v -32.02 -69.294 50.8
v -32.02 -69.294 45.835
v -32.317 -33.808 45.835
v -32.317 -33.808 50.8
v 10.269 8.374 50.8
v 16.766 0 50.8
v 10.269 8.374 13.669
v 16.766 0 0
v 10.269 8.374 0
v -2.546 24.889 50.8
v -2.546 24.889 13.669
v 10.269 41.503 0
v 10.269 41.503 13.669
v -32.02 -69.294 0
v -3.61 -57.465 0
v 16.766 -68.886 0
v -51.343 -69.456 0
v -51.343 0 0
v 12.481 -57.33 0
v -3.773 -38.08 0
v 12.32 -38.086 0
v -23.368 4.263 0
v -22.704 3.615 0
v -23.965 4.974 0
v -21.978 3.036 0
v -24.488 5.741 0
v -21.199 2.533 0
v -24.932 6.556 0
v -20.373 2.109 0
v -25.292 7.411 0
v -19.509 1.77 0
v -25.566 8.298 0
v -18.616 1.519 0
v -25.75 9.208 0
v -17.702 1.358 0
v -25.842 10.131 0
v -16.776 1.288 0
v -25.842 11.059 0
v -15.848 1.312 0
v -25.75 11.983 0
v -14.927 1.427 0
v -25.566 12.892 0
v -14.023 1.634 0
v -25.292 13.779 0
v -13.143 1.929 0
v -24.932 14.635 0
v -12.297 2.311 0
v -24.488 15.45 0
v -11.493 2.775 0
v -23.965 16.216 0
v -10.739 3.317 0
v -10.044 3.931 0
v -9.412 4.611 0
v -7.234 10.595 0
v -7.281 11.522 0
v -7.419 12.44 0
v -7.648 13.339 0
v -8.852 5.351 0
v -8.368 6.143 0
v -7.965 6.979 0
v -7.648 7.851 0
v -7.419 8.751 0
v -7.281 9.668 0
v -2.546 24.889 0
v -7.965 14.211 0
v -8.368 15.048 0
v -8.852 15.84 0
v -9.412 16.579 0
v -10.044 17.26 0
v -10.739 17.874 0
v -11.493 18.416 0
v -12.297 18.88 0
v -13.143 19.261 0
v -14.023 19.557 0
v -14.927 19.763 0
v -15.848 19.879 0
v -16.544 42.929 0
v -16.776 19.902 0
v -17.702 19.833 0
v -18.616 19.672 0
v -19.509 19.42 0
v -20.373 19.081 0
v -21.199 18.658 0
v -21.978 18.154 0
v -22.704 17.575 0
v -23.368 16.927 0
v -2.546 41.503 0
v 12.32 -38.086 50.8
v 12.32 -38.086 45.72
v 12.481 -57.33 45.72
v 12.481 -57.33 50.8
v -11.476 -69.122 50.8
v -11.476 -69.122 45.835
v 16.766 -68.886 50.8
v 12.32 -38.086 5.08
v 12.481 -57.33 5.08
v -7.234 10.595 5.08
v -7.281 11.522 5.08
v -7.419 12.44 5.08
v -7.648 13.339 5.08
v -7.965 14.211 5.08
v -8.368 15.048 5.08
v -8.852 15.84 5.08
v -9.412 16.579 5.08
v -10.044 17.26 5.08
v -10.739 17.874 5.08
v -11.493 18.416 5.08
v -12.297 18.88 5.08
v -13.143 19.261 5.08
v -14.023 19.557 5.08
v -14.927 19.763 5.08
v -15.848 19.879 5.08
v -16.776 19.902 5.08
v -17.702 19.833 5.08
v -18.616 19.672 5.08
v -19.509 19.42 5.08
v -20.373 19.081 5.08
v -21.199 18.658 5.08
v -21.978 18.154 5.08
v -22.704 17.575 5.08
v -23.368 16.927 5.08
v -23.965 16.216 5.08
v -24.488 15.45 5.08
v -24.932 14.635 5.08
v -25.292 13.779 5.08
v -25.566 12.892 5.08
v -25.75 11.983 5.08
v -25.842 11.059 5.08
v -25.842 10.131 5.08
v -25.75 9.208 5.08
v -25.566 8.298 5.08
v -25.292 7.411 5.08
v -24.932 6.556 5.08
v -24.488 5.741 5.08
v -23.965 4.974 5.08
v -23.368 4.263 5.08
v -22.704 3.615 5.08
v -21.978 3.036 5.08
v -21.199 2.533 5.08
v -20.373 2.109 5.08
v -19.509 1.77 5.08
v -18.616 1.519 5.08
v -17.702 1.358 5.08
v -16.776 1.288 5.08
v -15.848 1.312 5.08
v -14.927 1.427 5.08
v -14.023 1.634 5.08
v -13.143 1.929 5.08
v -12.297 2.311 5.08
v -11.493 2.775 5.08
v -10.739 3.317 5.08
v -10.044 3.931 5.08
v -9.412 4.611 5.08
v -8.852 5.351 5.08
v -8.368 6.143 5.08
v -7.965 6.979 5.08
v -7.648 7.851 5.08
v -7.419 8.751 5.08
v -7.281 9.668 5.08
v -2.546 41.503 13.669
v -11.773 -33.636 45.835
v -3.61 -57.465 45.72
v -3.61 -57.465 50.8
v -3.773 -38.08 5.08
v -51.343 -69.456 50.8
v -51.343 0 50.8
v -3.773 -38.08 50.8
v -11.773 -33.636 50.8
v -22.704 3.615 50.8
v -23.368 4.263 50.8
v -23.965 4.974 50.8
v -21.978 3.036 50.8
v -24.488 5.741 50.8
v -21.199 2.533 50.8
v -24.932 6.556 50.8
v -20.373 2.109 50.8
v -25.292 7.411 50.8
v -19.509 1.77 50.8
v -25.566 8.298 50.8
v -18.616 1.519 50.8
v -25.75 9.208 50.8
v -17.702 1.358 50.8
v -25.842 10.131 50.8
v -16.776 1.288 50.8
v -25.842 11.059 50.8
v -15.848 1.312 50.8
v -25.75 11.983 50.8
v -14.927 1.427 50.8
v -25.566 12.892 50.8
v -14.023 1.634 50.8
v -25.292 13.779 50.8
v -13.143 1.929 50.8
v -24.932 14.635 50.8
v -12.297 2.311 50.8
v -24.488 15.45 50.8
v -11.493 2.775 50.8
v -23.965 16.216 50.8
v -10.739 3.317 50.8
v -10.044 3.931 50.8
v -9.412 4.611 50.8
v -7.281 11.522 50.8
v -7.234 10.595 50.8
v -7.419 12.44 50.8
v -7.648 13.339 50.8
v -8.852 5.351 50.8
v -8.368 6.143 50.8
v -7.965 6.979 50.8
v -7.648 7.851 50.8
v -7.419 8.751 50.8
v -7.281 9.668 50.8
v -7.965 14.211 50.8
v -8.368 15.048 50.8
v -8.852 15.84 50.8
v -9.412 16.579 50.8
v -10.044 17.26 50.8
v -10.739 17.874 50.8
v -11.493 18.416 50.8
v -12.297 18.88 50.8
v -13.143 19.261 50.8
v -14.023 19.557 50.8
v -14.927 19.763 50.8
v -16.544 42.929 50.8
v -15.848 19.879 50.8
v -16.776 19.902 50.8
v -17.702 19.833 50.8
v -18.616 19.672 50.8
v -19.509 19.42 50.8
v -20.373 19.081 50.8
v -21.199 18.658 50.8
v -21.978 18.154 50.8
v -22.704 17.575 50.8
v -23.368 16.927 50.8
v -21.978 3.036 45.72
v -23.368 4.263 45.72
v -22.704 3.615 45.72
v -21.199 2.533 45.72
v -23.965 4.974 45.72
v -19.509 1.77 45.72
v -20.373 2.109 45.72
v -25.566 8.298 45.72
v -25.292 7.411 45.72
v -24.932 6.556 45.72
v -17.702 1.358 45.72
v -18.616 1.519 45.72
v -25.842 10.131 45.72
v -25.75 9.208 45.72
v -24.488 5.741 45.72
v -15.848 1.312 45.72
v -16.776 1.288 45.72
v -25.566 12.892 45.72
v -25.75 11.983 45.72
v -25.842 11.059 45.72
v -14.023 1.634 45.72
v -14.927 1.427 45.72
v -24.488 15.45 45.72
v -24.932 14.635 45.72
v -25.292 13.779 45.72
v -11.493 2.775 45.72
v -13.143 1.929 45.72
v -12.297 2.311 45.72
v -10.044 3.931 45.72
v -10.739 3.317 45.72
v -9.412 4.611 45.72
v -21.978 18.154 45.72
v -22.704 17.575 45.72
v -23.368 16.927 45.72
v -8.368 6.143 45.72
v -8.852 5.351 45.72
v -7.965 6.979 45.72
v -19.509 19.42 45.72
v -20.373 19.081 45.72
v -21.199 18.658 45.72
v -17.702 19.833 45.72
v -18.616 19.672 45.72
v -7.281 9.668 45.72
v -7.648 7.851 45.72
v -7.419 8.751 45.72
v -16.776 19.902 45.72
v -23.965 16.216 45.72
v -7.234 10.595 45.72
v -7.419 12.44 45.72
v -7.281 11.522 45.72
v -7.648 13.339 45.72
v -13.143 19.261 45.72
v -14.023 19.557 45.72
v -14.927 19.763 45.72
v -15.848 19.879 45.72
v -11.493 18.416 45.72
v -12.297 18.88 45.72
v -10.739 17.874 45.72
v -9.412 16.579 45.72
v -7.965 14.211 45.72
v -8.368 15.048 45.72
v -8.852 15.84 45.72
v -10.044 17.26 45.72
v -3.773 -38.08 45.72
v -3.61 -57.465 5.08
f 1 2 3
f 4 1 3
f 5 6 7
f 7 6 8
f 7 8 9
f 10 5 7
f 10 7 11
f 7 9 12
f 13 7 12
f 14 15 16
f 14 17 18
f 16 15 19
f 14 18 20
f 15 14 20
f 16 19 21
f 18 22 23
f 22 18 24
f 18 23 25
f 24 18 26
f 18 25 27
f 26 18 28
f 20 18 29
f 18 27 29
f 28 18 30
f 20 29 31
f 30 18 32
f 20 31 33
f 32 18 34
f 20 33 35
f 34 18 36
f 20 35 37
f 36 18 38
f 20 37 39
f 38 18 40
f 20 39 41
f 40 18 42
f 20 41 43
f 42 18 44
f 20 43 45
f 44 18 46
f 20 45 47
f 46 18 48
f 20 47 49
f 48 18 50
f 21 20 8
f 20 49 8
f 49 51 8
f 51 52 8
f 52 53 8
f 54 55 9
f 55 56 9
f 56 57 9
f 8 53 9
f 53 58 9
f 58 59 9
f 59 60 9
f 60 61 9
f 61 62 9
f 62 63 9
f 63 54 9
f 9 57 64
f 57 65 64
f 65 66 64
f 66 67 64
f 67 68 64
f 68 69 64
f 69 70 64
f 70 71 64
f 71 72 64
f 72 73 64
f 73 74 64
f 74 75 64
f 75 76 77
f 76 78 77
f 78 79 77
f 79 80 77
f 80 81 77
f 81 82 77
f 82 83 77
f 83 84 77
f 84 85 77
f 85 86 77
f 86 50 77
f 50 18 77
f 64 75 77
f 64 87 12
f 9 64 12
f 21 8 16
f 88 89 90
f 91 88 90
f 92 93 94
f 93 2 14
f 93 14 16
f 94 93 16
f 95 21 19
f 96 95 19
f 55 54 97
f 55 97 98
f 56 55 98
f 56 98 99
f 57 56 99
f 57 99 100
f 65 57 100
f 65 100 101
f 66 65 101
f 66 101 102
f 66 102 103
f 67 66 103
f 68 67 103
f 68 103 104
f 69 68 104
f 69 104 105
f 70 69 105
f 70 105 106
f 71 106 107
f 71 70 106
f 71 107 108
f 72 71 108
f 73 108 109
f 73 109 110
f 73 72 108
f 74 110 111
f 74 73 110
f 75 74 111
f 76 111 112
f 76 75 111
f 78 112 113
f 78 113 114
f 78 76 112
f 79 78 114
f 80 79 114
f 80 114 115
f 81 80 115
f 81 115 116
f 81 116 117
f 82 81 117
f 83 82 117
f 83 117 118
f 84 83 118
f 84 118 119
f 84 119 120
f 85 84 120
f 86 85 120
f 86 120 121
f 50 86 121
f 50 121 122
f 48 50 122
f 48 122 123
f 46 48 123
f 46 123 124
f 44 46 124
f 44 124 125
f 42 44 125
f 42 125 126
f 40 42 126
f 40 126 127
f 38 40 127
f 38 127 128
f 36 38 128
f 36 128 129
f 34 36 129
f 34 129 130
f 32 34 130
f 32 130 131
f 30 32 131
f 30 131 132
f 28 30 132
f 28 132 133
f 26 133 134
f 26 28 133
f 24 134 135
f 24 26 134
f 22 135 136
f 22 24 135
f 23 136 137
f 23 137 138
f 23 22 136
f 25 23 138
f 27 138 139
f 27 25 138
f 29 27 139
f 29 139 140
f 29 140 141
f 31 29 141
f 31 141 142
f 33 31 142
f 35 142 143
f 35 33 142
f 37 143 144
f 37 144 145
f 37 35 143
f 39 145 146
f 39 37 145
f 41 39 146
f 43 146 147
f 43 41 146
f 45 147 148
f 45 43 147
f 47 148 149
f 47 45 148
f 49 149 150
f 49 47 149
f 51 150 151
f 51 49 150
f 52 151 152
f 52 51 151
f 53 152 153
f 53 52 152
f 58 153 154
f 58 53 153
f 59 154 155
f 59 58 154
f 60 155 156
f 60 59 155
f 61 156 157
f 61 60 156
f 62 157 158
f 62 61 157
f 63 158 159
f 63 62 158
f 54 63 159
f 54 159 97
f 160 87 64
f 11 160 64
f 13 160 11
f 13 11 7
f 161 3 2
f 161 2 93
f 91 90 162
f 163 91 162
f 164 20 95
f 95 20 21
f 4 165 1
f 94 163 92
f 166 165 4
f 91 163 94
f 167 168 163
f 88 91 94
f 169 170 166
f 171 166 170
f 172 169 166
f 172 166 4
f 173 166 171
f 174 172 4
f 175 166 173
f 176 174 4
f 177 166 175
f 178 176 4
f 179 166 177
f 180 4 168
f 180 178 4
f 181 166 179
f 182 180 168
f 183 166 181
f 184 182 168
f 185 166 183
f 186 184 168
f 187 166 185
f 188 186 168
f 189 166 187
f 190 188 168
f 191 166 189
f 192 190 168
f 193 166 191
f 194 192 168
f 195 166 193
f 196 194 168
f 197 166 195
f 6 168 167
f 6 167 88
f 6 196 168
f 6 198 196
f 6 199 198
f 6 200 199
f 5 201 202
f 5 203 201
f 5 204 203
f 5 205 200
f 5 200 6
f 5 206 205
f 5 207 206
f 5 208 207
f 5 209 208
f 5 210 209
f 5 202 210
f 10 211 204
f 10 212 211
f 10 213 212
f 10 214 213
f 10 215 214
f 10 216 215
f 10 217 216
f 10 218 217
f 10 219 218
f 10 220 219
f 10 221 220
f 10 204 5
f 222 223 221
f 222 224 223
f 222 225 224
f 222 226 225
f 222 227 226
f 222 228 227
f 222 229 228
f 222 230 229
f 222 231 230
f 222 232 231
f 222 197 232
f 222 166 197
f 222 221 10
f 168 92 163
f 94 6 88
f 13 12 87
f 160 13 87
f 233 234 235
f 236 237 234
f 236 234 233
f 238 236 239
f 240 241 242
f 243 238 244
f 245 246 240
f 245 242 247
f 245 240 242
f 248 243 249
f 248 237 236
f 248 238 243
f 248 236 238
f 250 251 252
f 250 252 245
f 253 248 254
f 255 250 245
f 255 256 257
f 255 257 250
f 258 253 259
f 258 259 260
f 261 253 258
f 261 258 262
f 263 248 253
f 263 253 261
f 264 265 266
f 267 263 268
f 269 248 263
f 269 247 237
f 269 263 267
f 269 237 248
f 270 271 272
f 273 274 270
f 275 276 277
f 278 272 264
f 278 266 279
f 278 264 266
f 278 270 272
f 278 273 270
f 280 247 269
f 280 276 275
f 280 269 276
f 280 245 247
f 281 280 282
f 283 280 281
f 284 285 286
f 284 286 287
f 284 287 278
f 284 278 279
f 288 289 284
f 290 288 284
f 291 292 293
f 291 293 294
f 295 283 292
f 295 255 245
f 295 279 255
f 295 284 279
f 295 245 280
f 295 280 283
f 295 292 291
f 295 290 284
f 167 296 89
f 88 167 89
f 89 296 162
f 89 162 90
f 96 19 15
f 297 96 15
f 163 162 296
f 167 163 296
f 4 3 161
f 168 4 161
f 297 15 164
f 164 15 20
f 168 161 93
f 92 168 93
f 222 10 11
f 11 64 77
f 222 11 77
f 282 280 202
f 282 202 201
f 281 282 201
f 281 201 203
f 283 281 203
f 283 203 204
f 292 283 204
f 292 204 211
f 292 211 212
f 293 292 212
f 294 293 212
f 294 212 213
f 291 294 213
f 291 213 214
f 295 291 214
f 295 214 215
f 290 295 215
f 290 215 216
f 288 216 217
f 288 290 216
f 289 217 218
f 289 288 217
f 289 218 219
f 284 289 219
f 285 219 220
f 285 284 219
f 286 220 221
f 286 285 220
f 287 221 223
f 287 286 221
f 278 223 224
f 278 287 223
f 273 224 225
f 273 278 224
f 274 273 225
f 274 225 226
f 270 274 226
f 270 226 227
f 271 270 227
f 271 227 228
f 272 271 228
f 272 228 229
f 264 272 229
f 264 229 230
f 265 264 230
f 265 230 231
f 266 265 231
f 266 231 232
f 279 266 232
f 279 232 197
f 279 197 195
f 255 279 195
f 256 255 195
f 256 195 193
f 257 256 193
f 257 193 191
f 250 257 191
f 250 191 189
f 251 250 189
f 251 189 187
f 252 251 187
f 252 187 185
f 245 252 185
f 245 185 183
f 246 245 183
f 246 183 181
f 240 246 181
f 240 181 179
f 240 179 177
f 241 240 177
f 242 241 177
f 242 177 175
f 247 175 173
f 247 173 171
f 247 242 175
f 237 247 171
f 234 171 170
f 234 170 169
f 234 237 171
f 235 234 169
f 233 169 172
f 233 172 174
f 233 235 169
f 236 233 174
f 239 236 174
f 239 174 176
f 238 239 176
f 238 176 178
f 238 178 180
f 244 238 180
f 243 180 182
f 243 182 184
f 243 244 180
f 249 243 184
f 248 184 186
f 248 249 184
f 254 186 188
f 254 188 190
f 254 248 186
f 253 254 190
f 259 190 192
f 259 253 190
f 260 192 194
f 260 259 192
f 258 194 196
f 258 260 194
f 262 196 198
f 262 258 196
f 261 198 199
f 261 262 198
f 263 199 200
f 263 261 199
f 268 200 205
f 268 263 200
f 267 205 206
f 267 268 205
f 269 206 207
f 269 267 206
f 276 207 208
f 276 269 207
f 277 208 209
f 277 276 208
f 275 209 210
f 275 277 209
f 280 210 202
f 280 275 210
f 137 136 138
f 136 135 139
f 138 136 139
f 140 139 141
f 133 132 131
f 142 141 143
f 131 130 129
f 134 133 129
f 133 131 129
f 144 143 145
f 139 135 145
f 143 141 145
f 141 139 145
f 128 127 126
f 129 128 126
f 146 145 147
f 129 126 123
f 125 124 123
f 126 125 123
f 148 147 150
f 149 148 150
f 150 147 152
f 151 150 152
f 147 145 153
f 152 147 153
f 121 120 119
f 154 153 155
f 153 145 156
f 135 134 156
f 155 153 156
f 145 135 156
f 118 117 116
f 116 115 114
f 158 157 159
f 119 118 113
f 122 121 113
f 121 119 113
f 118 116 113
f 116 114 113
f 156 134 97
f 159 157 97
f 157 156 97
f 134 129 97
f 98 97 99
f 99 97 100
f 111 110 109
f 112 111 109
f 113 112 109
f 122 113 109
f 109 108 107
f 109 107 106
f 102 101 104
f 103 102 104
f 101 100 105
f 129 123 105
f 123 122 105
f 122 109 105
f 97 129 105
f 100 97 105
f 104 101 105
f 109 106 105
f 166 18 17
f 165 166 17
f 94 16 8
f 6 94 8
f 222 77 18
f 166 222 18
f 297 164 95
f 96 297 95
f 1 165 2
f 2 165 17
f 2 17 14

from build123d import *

# Parameters (mm, degrees)
F0_R     = 9.3096662381
F1_DEPTH = 50.8
F2_DEPTH = 13.66946
F3_DEPTH = 45.83504
F4_START = 5.08
F4_DEPTH = 40.64
F5_START = 5.08
F5_DEPTH = 40.64


with BuildPart() as f1:
    # F0 (on Top) → F1 (new body)
    with BuildSketch(Plane.XY):
        Polygon((-51.3433143497, 0), (-51.3433143497, -69.4561004639), (-32.0200270793, -69.294249187), (-32.3172560351, -33.8083351523), (-11.77348243, -33.6362611184), (-11.4762534741, -69.122175153), (16.7662296444, -68.8856169581), (16.7662296444, 0), (10.2686649188, 8.3737781411), (-2.5458205626, 24.8885283509), (-16.5439583361, 42.9287180305), align=None)
        Polygon((-3.6103976934, -57.465070353), (-3.772769589, -38.0796268582), (12.3200837265, -38.0858059556), (12.4812749246, -57.3302869839), align=None, mode=Mode.SUBTRACT)
        with Locations((-16.5439583361, 10.5952649524)):
            Circle(F0_R, mode=Mode.SUBTRACT)
    extrude(amount=F1_DEPTH)

    # F0 (on Top) → F2 (join)
    with BuildSketch(Plane.XY):
        Polygon((-2.5458205626, 41.5025129914), (-2.5458205626, 24.8885283509), (10.2686649188, 8.3737781411), (10.2686649188, 41.5025129914), align=None)
    extrude(amount=F2_DEPTH)

    # F0 (on Top) → F3 (join)
    with BuildSketch(Plane.XY):
        Polygon((-32.3172560351, -33.8083351523), (-32.0200270793, -69.294249187), (-11.4762534741, -69.122175153), (-11.77348243, -33.6362611184), align=None)
    extrude(amount=F3_DEPTH)

    # F0 (on Top) → F4 (join)
    with BuildSketch(Plane.XY.offset(F4_START)):
        Polygon((12.3200837265, -38.0858059556), (-3.772769589, -38.0796268582), (-3.6103976934, -57.465070353), (12.4812749246, -57.3302869839), align=None)
    extrude(amount=F4_DEPTH)

    # F0 (on Top) → F5 (join)
    with BuildSketch(Plane.XY.offset(F5_START)):
        with Locations((-16.5439583361, 10.5952649524)):
            Circle(F0_R)
    extrude(amount=F5_DEPTH)


solid = f1.part
